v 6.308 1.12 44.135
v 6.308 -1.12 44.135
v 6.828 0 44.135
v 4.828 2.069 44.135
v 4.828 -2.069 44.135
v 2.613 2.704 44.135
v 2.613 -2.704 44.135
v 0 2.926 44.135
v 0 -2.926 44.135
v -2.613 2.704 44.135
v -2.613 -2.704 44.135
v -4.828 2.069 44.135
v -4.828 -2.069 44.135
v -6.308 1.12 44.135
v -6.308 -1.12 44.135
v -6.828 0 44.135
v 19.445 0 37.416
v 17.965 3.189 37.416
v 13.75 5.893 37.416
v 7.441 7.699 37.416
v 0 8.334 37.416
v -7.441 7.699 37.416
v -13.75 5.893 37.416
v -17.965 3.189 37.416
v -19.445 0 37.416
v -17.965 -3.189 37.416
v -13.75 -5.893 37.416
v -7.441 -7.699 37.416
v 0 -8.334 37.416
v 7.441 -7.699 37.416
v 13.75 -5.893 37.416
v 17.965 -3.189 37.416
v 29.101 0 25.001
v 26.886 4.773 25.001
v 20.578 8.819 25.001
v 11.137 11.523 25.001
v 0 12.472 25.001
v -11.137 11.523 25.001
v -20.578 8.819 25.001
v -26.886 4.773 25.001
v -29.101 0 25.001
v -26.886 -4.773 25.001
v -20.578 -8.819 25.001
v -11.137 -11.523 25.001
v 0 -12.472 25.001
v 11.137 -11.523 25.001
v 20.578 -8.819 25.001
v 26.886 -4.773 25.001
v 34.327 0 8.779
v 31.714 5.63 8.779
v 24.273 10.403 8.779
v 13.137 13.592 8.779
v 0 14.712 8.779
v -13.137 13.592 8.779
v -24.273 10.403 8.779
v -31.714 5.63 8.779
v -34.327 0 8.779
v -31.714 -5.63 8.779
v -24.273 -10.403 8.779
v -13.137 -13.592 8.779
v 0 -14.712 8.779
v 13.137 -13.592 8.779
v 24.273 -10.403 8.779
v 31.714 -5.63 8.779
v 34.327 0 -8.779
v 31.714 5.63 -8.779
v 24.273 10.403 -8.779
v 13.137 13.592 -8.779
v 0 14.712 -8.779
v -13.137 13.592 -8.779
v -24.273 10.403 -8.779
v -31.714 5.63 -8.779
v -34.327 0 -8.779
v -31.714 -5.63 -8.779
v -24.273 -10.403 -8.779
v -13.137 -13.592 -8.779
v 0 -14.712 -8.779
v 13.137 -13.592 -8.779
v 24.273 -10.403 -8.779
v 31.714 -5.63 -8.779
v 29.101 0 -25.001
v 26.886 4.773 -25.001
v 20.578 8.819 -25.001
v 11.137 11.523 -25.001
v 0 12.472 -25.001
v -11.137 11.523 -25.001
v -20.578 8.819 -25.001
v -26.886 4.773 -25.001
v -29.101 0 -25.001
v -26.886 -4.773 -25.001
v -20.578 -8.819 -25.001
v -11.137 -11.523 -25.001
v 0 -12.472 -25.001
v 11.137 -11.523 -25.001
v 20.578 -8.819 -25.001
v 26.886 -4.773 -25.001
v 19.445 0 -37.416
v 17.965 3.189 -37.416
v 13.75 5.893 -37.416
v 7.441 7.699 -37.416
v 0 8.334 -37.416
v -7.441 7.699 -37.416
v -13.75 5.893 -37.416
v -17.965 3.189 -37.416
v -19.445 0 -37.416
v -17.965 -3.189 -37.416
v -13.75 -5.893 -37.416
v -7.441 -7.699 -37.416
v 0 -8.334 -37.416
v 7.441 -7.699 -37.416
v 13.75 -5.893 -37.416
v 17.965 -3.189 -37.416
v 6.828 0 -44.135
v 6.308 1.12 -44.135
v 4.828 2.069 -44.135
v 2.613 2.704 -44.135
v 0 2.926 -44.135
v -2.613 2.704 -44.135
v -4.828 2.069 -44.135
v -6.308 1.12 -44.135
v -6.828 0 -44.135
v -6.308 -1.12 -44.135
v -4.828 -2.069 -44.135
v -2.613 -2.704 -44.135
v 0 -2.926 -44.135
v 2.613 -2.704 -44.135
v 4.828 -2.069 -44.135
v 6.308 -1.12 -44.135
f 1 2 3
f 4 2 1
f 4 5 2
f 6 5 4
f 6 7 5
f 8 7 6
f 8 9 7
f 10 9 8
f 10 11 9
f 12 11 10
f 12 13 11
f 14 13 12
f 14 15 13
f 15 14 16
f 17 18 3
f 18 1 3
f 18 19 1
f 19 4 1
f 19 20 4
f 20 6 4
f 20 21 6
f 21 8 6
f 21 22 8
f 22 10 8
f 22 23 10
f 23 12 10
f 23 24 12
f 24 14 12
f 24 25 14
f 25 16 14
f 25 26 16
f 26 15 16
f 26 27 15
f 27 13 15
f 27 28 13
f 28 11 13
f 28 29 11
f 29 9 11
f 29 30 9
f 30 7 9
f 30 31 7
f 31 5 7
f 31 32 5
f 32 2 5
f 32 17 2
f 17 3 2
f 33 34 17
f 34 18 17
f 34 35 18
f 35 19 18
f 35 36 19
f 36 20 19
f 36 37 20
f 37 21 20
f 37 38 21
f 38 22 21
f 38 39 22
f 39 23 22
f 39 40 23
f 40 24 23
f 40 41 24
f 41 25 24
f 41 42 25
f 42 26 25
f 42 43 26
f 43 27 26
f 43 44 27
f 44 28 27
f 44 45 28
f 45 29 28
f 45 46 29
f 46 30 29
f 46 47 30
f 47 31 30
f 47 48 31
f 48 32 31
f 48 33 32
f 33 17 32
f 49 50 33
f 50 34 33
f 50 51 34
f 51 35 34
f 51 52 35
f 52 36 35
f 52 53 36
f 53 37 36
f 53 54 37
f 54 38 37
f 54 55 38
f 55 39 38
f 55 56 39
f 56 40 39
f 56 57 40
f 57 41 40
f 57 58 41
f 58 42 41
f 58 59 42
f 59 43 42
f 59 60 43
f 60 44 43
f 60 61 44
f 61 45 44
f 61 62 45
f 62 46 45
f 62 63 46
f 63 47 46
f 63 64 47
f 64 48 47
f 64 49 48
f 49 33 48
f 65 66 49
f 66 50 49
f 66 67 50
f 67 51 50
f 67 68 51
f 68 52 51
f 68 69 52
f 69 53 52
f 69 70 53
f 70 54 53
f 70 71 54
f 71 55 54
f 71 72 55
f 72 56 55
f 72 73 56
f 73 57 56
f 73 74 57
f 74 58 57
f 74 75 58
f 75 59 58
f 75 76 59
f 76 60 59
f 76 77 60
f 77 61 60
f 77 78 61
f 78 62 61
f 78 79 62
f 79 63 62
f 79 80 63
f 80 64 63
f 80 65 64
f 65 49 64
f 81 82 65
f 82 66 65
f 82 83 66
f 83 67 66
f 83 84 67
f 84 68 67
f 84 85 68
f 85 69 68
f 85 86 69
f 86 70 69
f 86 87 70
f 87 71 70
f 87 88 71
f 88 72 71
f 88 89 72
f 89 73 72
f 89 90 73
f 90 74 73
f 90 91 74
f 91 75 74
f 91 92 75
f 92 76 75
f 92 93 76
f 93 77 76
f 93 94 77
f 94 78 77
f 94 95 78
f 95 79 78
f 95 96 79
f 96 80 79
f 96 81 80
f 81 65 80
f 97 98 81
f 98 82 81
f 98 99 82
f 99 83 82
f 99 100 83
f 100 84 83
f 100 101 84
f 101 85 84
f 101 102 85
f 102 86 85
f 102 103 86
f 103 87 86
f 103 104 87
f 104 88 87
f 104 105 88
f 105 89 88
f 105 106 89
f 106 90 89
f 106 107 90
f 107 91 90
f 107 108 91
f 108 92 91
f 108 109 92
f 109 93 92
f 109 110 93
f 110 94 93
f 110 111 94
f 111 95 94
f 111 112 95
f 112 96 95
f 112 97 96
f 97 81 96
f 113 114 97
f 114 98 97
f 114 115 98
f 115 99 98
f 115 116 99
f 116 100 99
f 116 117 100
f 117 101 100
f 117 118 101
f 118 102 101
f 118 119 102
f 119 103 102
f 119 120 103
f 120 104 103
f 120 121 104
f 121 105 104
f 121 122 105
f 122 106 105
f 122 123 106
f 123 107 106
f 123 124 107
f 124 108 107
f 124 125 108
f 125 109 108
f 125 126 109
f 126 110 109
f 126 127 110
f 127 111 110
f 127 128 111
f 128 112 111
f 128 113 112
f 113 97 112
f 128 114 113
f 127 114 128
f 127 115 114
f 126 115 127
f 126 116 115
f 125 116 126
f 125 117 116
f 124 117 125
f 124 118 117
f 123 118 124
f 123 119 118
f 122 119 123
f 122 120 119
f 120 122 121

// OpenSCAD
// Generated by SolidPython 1.0.1 on 2020-07-29 00:46:47


scale(v = [7, 3, 9]) {
	sphere(r = 5);
}
/***********************************************
*********      SolidPython code:      **********
************************************************
 
# import packages: SolidPython
from solid import *
from solid.utils import *
from itertools import chain, combinations, permutations


class Resize:

    def __init__(self, scad_file):
        self.scad_file = scad_file
        #self.scad_file = import_scad(scad_file)
        # cone/cylinder param:
        self.r1 = 0
        self.r2 = 0
        self.h = 0
        # rectangular prism param:
        self.w = 0
        self.l = 0
        # ellipse param:
        self.r = 0

    # import OpenScad code (file name corresponds to shape)


    # classify shape + parameters
    def assign(self, param1, param2, param3):
        if self.scad_file == 'cone.scad':
            self.r1 = param1
            self.r2 = param2
            self.h = param3
        elif self.scad_file == 'cylinder.scad':
            self.r1 = param1
            self.r2 = param2
            self.h = param3
        elif self.scad_file == 'rectangularPrism.scad':
            self.h = param1
            self.l = param2
            self.w = param3
        else:
            self.r = param1
            self.h = param2

    # resize parameters
    def iterate(self):
        x = range(3, 20, 2)
        i = 1
        if self.scad_file == 'cone.scad':
            tempList = list(permutations(x, 2))
            for temp in tempList:
                param1 = temp[0]
                param2 = temp[1]
                filepath = 'produced_scad_files/' + 'cone' + str(param1) + '_' + str(param2) + '_' + '.scad'
                scad_render_to_file(cylinder(h=param1, r1=param2, r2=0), filepath)

        elif self.scad_file == 'cylinder.scad':
            tempList = list(permutations(x, 3))
            for temp in tempList:
                param1 = temp[0]
                param2 = temp[1]
                filepath = 'produced_scad_files/' + 'cylinder' + str(param1) + '_' + str(param2) + '_' + '.scad'
                scad_render_to_file(cylinder(h=param1, r1=param2, r2=param2), filepath)

        elif self.scad_file == 'rectangularPrism.scad':
            tempList = list(permutations(x, 3))
            for temp in tempList:
                param1 = temp[0]
                param2 = temp[1]
                param3 = temp[2]
                filepath = 'produced_scad_files/' + 'rectangularPrism' + str(param1) + '_' + str(param2) + '_' + str(
                    param3) + '.scad'
                scad_render_to_file(cube(size=(param1, param2, param3)), filepath)

        elif self.scad_file == 'ellipse.scad':
            tempList = list(permutations(x, 4))
            for temp in tempList:
                param1 = temp[0]
                param2 = temp[1]
                param3 = temp[2]
                param4 = temp[3]
                filepath = 'produced_scad_files/' + 'ellipse' + str(param1) + '_' + str(param2) + '_' + str(param3) + '_' + str(param4) + '.scad'
                scad_render_to_file(scale([param1, param2, param3])(sphere(r=param4)), filepath)

    def render_to_scadfile(self):
        scad_render_to_file(scad, 'example.scad') 
 
************************************************/
